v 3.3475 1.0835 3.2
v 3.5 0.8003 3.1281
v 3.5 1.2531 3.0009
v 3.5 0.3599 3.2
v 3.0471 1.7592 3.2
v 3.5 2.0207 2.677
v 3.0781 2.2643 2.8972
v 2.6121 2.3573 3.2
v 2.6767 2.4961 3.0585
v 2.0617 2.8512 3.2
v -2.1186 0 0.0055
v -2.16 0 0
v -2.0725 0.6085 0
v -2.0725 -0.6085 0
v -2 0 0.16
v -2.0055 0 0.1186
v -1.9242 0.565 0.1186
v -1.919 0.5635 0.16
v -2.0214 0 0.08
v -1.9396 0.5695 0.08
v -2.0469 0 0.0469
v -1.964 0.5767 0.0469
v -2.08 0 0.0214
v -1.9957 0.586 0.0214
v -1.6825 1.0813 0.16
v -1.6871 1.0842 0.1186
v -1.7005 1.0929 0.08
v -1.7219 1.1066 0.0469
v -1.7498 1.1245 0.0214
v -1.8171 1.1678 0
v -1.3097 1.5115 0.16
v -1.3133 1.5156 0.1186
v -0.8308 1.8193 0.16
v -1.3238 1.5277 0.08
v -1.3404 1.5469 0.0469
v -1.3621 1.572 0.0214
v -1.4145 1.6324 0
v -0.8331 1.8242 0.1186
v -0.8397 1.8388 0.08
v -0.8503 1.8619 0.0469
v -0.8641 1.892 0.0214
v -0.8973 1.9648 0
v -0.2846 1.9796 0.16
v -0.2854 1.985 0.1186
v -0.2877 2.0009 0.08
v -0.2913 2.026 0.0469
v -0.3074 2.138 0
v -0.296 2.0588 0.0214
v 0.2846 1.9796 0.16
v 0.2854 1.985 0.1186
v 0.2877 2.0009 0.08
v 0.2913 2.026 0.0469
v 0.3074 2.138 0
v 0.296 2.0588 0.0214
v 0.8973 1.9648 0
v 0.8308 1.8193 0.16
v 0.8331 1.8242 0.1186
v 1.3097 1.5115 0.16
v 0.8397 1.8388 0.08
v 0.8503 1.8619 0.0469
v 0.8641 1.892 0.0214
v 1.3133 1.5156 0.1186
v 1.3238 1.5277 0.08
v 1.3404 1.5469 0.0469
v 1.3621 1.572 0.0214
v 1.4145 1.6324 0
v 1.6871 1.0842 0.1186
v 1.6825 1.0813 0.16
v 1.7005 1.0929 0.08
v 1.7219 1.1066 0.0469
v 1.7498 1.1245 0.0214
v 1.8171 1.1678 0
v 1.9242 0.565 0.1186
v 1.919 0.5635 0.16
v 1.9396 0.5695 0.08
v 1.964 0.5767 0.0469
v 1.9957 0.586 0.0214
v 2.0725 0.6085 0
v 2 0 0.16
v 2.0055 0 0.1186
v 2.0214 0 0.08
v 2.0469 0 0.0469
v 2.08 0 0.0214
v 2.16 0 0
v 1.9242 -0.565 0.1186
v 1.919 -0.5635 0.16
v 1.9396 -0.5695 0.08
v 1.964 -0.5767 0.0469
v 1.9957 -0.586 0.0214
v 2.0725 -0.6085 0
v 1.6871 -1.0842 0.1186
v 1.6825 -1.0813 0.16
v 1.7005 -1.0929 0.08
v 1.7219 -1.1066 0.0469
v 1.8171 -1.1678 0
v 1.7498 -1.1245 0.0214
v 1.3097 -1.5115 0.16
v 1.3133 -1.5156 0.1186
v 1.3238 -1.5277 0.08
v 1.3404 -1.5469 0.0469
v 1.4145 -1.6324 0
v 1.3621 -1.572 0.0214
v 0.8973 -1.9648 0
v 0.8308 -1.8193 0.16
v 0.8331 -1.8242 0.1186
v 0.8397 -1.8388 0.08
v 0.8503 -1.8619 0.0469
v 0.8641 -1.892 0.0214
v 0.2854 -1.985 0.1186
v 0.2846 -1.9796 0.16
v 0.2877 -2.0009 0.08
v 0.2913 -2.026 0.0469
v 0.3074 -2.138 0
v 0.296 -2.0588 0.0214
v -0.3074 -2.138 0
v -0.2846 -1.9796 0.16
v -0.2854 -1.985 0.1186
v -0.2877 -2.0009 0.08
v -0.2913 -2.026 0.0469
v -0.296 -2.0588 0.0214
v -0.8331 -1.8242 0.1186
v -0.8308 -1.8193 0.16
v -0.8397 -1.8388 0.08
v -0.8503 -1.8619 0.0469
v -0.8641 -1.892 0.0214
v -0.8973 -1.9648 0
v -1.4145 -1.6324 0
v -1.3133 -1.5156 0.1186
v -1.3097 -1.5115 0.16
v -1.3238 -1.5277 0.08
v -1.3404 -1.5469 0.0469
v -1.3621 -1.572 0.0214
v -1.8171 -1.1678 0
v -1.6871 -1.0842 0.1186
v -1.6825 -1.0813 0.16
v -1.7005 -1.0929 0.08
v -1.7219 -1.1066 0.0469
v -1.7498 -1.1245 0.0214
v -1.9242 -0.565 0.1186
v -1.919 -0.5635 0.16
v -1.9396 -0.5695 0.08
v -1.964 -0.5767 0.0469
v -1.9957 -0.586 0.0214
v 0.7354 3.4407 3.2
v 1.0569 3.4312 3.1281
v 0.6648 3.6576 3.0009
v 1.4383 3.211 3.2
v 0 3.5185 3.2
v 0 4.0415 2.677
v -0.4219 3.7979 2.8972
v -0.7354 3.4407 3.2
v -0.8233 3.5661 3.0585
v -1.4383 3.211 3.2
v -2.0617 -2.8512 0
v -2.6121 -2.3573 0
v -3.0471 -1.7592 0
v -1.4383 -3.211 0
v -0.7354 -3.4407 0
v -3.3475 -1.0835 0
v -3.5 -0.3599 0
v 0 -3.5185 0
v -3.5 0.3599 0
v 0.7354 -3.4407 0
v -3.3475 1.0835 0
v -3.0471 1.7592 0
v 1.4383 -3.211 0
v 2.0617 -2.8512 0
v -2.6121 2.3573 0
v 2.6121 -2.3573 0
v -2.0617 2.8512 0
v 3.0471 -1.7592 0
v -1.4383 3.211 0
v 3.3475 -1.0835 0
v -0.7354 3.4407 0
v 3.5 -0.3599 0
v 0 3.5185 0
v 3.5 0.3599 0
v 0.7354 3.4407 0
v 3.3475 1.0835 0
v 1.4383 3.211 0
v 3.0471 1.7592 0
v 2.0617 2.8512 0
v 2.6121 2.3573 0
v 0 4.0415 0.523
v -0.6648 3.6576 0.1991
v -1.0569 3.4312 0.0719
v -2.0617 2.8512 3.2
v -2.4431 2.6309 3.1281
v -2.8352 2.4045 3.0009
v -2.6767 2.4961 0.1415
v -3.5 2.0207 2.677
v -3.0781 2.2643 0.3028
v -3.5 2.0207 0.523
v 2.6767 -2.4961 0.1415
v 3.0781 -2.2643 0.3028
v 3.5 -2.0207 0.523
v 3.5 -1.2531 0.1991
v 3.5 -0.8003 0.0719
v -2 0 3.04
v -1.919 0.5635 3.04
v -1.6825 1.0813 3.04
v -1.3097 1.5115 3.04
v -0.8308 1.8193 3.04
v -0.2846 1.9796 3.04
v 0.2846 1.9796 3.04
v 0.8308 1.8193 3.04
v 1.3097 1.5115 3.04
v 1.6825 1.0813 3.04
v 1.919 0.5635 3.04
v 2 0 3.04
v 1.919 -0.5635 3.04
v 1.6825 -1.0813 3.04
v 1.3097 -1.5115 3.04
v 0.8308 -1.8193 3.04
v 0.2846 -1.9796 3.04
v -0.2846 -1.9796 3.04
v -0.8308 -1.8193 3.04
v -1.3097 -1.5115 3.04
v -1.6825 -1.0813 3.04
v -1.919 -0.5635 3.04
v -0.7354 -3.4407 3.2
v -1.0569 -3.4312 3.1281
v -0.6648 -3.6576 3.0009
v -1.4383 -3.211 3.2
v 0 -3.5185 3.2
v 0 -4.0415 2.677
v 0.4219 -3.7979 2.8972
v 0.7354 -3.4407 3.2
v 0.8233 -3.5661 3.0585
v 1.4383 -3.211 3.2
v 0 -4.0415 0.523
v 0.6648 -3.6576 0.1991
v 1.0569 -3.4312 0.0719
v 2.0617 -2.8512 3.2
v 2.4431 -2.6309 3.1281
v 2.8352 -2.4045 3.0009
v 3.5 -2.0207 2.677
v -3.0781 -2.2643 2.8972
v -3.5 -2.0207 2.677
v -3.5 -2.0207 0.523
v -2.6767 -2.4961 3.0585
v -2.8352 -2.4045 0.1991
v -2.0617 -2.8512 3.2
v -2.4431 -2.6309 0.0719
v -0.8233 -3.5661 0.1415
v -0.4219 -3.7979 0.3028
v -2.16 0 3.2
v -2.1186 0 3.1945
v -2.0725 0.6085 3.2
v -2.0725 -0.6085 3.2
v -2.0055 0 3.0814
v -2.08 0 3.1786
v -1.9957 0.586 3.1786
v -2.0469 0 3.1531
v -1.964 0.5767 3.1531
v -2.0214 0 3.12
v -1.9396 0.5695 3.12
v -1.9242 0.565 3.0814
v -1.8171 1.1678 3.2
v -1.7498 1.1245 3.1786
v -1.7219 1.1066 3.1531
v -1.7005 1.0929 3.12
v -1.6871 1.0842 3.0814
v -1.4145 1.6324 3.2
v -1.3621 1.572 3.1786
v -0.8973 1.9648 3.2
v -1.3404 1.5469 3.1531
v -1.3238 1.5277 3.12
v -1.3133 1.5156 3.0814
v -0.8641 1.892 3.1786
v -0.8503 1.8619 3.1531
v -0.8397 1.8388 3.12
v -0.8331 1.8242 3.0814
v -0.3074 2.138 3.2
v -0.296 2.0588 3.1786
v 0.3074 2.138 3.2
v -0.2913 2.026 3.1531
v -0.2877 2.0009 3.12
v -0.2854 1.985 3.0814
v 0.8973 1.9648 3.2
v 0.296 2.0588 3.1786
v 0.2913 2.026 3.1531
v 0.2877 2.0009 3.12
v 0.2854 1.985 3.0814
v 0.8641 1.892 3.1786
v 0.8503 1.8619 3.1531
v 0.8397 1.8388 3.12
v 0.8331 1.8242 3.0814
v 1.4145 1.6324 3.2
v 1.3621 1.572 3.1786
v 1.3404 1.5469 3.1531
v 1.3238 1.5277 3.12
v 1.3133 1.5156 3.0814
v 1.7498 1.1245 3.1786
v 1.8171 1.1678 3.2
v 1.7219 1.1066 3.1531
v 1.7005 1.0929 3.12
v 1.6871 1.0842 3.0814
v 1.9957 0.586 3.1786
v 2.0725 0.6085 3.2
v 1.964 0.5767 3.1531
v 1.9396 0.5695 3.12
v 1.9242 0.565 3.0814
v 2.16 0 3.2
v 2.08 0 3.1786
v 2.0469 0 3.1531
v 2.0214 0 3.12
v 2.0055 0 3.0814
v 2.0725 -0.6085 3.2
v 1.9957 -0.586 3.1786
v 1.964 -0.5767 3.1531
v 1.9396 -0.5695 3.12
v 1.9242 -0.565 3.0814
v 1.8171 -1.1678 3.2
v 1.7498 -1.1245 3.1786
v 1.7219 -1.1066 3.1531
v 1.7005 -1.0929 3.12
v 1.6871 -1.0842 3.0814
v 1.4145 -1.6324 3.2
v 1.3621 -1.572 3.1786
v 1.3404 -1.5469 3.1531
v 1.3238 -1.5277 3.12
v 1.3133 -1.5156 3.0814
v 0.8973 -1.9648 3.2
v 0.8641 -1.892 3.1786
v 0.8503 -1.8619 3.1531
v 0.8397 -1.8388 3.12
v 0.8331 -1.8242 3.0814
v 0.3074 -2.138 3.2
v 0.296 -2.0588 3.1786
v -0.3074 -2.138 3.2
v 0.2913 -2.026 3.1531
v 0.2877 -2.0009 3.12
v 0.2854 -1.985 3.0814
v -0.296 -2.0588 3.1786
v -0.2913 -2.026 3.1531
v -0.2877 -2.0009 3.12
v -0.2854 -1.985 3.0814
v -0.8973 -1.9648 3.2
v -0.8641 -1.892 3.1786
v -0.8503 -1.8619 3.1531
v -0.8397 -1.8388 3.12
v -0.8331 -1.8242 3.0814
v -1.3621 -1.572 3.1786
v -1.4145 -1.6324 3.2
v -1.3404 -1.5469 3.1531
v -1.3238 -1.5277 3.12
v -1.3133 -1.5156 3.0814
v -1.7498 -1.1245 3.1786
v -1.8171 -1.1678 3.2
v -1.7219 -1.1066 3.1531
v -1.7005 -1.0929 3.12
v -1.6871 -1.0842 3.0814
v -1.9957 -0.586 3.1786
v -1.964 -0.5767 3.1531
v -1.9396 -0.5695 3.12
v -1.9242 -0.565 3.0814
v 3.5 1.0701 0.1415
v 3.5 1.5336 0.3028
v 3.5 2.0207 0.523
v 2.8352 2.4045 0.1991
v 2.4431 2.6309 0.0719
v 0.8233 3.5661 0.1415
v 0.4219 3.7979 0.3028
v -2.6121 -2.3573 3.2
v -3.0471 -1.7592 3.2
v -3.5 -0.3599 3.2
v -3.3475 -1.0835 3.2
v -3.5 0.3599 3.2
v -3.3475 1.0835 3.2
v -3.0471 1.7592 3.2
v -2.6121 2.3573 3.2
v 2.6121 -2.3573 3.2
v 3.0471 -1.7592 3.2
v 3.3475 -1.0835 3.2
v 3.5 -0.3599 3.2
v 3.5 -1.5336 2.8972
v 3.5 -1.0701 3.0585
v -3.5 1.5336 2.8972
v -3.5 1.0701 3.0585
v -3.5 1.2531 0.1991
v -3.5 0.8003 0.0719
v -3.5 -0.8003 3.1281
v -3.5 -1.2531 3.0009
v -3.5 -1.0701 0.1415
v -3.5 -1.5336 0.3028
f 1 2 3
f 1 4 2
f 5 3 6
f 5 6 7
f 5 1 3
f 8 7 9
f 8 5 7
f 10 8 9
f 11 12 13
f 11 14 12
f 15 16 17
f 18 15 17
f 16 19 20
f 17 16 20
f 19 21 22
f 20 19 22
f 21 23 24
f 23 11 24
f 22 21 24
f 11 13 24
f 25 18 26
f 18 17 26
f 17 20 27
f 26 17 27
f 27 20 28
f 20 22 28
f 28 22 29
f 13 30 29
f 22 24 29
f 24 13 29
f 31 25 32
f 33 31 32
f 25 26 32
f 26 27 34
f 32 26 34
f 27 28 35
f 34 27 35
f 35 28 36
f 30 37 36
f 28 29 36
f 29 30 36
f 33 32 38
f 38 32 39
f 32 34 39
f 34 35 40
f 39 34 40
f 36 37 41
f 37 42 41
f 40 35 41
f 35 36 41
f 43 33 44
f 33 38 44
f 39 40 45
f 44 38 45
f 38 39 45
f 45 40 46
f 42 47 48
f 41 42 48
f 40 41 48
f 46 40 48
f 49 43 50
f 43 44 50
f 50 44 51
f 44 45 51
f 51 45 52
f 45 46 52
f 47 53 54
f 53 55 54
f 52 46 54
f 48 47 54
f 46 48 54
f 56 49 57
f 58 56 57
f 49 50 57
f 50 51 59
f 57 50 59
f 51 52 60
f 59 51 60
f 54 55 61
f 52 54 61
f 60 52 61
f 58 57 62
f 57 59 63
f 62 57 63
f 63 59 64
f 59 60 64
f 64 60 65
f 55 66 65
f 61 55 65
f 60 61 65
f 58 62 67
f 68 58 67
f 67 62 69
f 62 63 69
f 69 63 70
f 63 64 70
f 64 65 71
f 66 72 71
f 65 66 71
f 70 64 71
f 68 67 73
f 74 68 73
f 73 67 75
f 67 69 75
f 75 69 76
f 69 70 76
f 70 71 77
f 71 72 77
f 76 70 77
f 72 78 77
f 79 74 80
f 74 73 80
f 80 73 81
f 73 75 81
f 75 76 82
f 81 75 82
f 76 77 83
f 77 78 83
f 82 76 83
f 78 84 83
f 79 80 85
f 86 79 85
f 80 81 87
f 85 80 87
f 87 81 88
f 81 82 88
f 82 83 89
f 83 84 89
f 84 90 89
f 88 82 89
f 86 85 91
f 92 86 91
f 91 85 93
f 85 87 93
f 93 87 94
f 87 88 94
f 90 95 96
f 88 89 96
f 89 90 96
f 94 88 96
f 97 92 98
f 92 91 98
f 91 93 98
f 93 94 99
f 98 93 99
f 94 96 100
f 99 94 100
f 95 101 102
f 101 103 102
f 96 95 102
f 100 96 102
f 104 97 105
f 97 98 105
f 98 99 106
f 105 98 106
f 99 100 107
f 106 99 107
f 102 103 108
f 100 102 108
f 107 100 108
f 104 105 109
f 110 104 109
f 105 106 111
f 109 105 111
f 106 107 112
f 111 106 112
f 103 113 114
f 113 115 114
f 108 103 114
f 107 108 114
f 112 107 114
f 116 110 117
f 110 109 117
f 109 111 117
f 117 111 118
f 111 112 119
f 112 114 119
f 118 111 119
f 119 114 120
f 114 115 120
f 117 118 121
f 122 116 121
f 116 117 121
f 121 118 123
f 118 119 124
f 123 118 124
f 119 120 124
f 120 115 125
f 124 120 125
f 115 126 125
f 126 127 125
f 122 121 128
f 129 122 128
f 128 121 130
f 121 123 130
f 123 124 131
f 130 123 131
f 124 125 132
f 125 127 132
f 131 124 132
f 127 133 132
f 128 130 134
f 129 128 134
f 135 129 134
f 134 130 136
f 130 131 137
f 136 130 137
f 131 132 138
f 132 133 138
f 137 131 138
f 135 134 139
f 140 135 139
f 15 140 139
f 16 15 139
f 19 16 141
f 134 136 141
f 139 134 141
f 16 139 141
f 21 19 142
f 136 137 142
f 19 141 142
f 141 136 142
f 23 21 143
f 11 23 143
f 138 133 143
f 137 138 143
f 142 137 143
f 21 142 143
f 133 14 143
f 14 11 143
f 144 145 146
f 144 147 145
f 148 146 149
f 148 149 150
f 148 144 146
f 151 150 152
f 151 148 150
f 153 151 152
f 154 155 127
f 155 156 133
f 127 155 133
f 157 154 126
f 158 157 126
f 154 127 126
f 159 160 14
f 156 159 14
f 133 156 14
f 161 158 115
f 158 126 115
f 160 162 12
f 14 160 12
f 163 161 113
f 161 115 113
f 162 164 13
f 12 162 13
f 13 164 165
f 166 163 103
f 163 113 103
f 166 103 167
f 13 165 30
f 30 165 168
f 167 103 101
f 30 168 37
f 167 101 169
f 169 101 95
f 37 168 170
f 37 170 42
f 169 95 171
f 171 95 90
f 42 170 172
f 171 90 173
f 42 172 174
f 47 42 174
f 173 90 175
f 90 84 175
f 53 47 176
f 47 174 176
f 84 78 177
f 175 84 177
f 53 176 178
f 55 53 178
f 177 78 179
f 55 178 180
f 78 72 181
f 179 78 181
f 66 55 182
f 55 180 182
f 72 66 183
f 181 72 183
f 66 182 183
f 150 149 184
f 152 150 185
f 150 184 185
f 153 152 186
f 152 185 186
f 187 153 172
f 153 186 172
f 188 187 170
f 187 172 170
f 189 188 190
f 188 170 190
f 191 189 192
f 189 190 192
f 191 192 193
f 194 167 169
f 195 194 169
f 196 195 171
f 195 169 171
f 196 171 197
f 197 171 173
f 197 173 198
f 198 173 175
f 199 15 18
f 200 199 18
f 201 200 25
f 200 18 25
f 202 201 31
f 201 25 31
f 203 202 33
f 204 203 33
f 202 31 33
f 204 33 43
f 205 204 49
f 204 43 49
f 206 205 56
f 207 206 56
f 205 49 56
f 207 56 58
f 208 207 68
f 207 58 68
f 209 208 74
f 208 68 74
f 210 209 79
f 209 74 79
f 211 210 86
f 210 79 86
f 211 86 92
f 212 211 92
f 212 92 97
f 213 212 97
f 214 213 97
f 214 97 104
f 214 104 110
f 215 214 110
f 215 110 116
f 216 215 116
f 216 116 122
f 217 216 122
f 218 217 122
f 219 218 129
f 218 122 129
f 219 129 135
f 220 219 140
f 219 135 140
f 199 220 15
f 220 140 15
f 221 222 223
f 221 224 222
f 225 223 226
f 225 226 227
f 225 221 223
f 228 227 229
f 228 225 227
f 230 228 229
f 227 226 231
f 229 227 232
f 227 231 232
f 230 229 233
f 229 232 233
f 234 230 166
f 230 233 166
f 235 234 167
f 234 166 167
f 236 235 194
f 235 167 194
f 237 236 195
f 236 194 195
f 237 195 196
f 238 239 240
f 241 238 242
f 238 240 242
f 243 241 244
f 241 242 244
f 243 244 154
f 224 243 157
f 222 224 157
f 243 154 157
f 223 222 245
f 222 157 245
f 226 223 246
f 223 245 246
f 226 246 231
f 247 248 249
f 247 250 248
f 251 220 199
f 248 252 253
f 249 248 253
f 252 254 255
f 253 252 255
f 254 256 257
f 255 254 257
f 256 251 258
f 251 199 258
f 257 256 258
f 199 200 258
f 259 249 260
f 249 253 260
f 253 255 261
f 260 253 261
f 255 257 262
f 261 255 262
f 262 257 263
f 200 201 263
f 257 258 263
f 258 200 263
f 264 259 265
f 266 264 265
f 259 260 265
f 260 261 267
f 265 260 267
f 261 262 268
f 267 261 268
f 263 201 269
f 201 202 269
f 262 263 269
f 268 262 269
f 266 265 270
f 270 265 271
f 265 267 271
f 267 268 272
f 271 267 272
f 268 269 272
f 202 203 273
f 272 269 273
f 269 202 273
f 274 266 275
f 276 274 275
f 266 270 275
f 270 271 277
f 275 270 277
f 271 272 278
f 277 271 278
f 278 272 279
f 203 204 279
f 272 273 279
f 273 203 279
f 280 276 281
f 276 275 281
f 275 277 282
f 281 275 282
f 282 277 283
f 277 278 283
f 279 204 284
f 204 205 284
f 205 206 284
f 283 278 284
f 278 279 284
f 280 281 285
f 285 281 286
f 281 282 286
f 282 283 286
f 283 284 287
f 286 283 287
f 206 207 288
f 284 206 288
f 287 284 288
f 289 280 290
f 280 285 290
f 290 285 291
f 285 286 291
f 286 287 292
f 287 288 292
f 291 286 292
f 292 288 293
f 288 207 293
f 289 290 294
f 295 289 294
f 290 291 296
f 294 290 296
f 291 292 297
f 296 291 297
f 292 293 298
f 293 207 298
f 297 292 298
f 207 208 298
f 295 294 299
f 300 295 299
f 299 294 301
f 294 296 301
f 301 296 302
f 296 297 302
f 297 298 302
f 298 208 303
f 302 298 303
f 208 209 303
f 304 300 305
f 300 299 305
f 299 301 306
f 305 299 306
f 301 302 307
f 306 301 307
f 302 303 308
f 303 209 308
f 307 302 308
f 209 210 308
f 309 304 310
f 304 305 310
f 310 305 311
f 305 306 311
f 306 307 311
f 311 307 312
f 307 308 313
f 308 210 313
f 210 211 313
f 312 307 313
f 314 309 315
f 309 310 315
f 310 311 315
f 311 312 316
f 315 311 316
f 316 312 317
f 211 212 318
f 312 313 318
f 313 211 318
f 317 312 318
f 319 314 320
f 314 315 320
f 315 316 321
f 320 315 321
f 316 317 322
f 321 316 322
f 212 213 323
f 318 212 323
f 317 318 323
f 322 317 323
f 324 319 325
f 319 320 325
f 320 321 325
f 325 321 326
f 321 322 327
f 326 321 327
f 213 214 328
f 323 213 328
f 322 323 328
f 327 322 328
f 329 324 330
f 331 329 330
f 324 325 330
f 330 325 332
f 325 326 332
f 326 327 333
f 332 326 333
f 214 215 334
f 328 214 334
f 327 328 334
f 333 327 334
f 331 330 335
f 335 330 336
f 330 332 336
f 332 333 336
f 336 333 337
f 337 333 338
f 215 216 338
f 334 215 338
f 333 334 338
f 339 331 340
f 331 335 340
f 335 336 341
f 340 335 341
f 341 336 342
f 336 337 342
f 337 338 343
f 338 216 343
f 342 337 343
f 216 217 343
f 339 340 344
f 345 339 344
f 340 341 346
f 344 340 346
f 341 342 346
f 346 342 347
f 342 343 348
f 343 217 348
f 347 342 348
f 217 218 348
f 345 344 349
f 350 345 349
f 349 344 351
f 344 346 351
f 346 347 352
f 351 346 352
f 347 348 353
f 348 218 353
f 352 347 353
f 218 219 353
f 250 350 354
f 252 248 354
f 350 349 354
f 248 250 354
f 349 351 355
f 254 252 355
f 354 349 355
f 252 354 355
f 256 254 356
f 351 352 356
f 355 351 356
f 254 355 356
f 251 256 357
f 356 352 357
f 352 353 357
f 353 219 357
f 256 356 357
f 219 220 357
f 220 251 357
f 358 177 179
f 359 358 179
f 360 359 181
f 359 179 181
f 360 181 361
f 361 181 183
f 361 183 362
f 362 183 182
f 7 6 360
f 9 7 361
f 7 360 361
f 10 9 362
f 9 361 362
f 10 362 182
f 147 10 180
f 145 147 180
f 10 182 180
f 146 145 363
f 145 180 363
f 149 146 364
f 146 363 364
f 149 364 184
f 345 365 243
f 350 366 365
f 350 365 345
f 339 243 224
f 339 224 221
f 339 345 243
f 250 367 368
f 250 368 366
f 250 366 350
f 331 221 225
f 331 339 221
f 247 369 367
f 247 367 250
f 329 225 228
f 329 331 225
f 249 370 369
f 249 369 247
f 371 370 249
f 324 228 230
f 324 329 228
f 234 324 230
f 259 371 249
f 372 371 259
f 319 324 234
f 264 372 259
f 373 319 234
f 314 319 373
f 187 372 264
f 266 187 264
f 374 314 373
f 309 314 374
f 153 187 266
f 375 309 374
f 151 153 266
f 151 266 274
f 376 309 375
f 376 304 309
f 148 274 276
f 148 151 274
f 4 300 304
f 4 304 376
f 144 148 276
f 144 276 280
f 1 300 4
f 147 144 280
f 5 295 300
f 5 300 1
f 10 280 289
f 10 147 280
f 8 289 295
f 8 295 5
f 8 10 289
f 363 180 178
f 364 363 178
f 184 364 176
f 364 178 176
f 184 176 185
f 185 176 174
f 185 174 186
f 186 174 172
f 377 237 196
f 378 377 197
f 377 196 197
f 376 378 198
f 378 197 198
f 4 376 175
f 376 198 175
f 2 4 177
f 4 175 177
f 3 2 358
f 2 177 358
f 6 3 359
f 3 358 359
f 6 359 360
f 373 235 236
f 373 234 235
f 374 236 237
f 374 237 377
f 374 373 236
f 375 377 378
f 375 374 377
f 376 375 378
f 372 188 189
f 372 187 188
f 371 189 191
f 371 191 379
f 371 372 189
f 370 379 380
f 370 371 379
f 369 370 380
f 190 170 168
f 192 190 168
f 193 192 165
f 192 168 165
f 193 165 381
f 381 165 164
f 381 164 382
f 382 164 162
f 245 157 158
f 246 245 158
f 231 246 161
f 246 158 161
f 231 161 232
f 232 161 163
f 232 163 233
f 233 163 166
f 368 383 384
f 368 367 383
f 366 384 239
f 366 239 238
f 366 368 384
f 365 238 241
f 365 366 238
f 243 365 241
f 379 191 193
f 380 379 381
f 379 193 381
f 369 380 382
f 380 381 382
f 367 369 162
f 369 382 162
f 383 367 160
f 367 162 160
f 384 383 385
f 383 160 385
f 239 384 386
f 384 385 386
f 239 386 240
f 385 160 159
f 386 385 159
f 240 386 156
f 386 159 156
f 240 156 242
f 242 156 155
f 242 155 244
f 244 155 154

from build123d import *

# Parameters (mm, degrees)
EXTRUDE_1_DEPTH     = 3.2
SKETCH_2_R          = 2
CUT_EXTRUDE_1_DEPTH = 3.2
FILLET_1_R          = 0.16


with BuildPart() as part:
    # 草图1 → 凸台-拉伸1 (new body)
    with BuildSketch(Plane.XY):
        Polygon((0, 4.041451884), (-3.5, 2.020725942), (-3.5, -2.020725942), (0, -4.041451884), (3.5, -2.020725942), (3.5, 2.020725942), align=None)
    extrude(amount=EXTRUDE_1_DEPTH)

    # 草图2 → 切除-拉伸1 (cut)
    with BuildSketch(Plane(origin=(0, 0, 0), x_dir=(-1, 0, 0), z_dir=(0, 0, -1))):
        Circle(SKETCH_2_R)
    extrude(amount=-CUT_EXTRUDE_1_DEPTH, mode=Mode.SUBTRACT)

    # 草图4 → 切除-旋转1 (revolve, cut)
    with BuildSketch(Plane(origin=(0, 0, 0), x_dir=(0, 0, -1), z_dir=(1, 0, 0))):
        Polygon((-2.677, 4.041451884), (-3.2, 3.518451884), (-3.2, 4.041451884), align=None)
        Polygon((0, 4.041451884), (-0.523, 4.041451884), (0, 3.518451884), align=None)
    revolve(axis=Axis((0, 0, 0), (0, 0, 1)), mode=Mode.SUBTRACT)

    # 圆角1
    fillet_1_edges = [part.edges().sort_by_distance(p)[0] for p in [
        (2, 0, 3.2),
        (2, 0, 0),
    ]]
    fillet(fillet_1_edges, radius=FILLET_1_R)


solid = part.part
